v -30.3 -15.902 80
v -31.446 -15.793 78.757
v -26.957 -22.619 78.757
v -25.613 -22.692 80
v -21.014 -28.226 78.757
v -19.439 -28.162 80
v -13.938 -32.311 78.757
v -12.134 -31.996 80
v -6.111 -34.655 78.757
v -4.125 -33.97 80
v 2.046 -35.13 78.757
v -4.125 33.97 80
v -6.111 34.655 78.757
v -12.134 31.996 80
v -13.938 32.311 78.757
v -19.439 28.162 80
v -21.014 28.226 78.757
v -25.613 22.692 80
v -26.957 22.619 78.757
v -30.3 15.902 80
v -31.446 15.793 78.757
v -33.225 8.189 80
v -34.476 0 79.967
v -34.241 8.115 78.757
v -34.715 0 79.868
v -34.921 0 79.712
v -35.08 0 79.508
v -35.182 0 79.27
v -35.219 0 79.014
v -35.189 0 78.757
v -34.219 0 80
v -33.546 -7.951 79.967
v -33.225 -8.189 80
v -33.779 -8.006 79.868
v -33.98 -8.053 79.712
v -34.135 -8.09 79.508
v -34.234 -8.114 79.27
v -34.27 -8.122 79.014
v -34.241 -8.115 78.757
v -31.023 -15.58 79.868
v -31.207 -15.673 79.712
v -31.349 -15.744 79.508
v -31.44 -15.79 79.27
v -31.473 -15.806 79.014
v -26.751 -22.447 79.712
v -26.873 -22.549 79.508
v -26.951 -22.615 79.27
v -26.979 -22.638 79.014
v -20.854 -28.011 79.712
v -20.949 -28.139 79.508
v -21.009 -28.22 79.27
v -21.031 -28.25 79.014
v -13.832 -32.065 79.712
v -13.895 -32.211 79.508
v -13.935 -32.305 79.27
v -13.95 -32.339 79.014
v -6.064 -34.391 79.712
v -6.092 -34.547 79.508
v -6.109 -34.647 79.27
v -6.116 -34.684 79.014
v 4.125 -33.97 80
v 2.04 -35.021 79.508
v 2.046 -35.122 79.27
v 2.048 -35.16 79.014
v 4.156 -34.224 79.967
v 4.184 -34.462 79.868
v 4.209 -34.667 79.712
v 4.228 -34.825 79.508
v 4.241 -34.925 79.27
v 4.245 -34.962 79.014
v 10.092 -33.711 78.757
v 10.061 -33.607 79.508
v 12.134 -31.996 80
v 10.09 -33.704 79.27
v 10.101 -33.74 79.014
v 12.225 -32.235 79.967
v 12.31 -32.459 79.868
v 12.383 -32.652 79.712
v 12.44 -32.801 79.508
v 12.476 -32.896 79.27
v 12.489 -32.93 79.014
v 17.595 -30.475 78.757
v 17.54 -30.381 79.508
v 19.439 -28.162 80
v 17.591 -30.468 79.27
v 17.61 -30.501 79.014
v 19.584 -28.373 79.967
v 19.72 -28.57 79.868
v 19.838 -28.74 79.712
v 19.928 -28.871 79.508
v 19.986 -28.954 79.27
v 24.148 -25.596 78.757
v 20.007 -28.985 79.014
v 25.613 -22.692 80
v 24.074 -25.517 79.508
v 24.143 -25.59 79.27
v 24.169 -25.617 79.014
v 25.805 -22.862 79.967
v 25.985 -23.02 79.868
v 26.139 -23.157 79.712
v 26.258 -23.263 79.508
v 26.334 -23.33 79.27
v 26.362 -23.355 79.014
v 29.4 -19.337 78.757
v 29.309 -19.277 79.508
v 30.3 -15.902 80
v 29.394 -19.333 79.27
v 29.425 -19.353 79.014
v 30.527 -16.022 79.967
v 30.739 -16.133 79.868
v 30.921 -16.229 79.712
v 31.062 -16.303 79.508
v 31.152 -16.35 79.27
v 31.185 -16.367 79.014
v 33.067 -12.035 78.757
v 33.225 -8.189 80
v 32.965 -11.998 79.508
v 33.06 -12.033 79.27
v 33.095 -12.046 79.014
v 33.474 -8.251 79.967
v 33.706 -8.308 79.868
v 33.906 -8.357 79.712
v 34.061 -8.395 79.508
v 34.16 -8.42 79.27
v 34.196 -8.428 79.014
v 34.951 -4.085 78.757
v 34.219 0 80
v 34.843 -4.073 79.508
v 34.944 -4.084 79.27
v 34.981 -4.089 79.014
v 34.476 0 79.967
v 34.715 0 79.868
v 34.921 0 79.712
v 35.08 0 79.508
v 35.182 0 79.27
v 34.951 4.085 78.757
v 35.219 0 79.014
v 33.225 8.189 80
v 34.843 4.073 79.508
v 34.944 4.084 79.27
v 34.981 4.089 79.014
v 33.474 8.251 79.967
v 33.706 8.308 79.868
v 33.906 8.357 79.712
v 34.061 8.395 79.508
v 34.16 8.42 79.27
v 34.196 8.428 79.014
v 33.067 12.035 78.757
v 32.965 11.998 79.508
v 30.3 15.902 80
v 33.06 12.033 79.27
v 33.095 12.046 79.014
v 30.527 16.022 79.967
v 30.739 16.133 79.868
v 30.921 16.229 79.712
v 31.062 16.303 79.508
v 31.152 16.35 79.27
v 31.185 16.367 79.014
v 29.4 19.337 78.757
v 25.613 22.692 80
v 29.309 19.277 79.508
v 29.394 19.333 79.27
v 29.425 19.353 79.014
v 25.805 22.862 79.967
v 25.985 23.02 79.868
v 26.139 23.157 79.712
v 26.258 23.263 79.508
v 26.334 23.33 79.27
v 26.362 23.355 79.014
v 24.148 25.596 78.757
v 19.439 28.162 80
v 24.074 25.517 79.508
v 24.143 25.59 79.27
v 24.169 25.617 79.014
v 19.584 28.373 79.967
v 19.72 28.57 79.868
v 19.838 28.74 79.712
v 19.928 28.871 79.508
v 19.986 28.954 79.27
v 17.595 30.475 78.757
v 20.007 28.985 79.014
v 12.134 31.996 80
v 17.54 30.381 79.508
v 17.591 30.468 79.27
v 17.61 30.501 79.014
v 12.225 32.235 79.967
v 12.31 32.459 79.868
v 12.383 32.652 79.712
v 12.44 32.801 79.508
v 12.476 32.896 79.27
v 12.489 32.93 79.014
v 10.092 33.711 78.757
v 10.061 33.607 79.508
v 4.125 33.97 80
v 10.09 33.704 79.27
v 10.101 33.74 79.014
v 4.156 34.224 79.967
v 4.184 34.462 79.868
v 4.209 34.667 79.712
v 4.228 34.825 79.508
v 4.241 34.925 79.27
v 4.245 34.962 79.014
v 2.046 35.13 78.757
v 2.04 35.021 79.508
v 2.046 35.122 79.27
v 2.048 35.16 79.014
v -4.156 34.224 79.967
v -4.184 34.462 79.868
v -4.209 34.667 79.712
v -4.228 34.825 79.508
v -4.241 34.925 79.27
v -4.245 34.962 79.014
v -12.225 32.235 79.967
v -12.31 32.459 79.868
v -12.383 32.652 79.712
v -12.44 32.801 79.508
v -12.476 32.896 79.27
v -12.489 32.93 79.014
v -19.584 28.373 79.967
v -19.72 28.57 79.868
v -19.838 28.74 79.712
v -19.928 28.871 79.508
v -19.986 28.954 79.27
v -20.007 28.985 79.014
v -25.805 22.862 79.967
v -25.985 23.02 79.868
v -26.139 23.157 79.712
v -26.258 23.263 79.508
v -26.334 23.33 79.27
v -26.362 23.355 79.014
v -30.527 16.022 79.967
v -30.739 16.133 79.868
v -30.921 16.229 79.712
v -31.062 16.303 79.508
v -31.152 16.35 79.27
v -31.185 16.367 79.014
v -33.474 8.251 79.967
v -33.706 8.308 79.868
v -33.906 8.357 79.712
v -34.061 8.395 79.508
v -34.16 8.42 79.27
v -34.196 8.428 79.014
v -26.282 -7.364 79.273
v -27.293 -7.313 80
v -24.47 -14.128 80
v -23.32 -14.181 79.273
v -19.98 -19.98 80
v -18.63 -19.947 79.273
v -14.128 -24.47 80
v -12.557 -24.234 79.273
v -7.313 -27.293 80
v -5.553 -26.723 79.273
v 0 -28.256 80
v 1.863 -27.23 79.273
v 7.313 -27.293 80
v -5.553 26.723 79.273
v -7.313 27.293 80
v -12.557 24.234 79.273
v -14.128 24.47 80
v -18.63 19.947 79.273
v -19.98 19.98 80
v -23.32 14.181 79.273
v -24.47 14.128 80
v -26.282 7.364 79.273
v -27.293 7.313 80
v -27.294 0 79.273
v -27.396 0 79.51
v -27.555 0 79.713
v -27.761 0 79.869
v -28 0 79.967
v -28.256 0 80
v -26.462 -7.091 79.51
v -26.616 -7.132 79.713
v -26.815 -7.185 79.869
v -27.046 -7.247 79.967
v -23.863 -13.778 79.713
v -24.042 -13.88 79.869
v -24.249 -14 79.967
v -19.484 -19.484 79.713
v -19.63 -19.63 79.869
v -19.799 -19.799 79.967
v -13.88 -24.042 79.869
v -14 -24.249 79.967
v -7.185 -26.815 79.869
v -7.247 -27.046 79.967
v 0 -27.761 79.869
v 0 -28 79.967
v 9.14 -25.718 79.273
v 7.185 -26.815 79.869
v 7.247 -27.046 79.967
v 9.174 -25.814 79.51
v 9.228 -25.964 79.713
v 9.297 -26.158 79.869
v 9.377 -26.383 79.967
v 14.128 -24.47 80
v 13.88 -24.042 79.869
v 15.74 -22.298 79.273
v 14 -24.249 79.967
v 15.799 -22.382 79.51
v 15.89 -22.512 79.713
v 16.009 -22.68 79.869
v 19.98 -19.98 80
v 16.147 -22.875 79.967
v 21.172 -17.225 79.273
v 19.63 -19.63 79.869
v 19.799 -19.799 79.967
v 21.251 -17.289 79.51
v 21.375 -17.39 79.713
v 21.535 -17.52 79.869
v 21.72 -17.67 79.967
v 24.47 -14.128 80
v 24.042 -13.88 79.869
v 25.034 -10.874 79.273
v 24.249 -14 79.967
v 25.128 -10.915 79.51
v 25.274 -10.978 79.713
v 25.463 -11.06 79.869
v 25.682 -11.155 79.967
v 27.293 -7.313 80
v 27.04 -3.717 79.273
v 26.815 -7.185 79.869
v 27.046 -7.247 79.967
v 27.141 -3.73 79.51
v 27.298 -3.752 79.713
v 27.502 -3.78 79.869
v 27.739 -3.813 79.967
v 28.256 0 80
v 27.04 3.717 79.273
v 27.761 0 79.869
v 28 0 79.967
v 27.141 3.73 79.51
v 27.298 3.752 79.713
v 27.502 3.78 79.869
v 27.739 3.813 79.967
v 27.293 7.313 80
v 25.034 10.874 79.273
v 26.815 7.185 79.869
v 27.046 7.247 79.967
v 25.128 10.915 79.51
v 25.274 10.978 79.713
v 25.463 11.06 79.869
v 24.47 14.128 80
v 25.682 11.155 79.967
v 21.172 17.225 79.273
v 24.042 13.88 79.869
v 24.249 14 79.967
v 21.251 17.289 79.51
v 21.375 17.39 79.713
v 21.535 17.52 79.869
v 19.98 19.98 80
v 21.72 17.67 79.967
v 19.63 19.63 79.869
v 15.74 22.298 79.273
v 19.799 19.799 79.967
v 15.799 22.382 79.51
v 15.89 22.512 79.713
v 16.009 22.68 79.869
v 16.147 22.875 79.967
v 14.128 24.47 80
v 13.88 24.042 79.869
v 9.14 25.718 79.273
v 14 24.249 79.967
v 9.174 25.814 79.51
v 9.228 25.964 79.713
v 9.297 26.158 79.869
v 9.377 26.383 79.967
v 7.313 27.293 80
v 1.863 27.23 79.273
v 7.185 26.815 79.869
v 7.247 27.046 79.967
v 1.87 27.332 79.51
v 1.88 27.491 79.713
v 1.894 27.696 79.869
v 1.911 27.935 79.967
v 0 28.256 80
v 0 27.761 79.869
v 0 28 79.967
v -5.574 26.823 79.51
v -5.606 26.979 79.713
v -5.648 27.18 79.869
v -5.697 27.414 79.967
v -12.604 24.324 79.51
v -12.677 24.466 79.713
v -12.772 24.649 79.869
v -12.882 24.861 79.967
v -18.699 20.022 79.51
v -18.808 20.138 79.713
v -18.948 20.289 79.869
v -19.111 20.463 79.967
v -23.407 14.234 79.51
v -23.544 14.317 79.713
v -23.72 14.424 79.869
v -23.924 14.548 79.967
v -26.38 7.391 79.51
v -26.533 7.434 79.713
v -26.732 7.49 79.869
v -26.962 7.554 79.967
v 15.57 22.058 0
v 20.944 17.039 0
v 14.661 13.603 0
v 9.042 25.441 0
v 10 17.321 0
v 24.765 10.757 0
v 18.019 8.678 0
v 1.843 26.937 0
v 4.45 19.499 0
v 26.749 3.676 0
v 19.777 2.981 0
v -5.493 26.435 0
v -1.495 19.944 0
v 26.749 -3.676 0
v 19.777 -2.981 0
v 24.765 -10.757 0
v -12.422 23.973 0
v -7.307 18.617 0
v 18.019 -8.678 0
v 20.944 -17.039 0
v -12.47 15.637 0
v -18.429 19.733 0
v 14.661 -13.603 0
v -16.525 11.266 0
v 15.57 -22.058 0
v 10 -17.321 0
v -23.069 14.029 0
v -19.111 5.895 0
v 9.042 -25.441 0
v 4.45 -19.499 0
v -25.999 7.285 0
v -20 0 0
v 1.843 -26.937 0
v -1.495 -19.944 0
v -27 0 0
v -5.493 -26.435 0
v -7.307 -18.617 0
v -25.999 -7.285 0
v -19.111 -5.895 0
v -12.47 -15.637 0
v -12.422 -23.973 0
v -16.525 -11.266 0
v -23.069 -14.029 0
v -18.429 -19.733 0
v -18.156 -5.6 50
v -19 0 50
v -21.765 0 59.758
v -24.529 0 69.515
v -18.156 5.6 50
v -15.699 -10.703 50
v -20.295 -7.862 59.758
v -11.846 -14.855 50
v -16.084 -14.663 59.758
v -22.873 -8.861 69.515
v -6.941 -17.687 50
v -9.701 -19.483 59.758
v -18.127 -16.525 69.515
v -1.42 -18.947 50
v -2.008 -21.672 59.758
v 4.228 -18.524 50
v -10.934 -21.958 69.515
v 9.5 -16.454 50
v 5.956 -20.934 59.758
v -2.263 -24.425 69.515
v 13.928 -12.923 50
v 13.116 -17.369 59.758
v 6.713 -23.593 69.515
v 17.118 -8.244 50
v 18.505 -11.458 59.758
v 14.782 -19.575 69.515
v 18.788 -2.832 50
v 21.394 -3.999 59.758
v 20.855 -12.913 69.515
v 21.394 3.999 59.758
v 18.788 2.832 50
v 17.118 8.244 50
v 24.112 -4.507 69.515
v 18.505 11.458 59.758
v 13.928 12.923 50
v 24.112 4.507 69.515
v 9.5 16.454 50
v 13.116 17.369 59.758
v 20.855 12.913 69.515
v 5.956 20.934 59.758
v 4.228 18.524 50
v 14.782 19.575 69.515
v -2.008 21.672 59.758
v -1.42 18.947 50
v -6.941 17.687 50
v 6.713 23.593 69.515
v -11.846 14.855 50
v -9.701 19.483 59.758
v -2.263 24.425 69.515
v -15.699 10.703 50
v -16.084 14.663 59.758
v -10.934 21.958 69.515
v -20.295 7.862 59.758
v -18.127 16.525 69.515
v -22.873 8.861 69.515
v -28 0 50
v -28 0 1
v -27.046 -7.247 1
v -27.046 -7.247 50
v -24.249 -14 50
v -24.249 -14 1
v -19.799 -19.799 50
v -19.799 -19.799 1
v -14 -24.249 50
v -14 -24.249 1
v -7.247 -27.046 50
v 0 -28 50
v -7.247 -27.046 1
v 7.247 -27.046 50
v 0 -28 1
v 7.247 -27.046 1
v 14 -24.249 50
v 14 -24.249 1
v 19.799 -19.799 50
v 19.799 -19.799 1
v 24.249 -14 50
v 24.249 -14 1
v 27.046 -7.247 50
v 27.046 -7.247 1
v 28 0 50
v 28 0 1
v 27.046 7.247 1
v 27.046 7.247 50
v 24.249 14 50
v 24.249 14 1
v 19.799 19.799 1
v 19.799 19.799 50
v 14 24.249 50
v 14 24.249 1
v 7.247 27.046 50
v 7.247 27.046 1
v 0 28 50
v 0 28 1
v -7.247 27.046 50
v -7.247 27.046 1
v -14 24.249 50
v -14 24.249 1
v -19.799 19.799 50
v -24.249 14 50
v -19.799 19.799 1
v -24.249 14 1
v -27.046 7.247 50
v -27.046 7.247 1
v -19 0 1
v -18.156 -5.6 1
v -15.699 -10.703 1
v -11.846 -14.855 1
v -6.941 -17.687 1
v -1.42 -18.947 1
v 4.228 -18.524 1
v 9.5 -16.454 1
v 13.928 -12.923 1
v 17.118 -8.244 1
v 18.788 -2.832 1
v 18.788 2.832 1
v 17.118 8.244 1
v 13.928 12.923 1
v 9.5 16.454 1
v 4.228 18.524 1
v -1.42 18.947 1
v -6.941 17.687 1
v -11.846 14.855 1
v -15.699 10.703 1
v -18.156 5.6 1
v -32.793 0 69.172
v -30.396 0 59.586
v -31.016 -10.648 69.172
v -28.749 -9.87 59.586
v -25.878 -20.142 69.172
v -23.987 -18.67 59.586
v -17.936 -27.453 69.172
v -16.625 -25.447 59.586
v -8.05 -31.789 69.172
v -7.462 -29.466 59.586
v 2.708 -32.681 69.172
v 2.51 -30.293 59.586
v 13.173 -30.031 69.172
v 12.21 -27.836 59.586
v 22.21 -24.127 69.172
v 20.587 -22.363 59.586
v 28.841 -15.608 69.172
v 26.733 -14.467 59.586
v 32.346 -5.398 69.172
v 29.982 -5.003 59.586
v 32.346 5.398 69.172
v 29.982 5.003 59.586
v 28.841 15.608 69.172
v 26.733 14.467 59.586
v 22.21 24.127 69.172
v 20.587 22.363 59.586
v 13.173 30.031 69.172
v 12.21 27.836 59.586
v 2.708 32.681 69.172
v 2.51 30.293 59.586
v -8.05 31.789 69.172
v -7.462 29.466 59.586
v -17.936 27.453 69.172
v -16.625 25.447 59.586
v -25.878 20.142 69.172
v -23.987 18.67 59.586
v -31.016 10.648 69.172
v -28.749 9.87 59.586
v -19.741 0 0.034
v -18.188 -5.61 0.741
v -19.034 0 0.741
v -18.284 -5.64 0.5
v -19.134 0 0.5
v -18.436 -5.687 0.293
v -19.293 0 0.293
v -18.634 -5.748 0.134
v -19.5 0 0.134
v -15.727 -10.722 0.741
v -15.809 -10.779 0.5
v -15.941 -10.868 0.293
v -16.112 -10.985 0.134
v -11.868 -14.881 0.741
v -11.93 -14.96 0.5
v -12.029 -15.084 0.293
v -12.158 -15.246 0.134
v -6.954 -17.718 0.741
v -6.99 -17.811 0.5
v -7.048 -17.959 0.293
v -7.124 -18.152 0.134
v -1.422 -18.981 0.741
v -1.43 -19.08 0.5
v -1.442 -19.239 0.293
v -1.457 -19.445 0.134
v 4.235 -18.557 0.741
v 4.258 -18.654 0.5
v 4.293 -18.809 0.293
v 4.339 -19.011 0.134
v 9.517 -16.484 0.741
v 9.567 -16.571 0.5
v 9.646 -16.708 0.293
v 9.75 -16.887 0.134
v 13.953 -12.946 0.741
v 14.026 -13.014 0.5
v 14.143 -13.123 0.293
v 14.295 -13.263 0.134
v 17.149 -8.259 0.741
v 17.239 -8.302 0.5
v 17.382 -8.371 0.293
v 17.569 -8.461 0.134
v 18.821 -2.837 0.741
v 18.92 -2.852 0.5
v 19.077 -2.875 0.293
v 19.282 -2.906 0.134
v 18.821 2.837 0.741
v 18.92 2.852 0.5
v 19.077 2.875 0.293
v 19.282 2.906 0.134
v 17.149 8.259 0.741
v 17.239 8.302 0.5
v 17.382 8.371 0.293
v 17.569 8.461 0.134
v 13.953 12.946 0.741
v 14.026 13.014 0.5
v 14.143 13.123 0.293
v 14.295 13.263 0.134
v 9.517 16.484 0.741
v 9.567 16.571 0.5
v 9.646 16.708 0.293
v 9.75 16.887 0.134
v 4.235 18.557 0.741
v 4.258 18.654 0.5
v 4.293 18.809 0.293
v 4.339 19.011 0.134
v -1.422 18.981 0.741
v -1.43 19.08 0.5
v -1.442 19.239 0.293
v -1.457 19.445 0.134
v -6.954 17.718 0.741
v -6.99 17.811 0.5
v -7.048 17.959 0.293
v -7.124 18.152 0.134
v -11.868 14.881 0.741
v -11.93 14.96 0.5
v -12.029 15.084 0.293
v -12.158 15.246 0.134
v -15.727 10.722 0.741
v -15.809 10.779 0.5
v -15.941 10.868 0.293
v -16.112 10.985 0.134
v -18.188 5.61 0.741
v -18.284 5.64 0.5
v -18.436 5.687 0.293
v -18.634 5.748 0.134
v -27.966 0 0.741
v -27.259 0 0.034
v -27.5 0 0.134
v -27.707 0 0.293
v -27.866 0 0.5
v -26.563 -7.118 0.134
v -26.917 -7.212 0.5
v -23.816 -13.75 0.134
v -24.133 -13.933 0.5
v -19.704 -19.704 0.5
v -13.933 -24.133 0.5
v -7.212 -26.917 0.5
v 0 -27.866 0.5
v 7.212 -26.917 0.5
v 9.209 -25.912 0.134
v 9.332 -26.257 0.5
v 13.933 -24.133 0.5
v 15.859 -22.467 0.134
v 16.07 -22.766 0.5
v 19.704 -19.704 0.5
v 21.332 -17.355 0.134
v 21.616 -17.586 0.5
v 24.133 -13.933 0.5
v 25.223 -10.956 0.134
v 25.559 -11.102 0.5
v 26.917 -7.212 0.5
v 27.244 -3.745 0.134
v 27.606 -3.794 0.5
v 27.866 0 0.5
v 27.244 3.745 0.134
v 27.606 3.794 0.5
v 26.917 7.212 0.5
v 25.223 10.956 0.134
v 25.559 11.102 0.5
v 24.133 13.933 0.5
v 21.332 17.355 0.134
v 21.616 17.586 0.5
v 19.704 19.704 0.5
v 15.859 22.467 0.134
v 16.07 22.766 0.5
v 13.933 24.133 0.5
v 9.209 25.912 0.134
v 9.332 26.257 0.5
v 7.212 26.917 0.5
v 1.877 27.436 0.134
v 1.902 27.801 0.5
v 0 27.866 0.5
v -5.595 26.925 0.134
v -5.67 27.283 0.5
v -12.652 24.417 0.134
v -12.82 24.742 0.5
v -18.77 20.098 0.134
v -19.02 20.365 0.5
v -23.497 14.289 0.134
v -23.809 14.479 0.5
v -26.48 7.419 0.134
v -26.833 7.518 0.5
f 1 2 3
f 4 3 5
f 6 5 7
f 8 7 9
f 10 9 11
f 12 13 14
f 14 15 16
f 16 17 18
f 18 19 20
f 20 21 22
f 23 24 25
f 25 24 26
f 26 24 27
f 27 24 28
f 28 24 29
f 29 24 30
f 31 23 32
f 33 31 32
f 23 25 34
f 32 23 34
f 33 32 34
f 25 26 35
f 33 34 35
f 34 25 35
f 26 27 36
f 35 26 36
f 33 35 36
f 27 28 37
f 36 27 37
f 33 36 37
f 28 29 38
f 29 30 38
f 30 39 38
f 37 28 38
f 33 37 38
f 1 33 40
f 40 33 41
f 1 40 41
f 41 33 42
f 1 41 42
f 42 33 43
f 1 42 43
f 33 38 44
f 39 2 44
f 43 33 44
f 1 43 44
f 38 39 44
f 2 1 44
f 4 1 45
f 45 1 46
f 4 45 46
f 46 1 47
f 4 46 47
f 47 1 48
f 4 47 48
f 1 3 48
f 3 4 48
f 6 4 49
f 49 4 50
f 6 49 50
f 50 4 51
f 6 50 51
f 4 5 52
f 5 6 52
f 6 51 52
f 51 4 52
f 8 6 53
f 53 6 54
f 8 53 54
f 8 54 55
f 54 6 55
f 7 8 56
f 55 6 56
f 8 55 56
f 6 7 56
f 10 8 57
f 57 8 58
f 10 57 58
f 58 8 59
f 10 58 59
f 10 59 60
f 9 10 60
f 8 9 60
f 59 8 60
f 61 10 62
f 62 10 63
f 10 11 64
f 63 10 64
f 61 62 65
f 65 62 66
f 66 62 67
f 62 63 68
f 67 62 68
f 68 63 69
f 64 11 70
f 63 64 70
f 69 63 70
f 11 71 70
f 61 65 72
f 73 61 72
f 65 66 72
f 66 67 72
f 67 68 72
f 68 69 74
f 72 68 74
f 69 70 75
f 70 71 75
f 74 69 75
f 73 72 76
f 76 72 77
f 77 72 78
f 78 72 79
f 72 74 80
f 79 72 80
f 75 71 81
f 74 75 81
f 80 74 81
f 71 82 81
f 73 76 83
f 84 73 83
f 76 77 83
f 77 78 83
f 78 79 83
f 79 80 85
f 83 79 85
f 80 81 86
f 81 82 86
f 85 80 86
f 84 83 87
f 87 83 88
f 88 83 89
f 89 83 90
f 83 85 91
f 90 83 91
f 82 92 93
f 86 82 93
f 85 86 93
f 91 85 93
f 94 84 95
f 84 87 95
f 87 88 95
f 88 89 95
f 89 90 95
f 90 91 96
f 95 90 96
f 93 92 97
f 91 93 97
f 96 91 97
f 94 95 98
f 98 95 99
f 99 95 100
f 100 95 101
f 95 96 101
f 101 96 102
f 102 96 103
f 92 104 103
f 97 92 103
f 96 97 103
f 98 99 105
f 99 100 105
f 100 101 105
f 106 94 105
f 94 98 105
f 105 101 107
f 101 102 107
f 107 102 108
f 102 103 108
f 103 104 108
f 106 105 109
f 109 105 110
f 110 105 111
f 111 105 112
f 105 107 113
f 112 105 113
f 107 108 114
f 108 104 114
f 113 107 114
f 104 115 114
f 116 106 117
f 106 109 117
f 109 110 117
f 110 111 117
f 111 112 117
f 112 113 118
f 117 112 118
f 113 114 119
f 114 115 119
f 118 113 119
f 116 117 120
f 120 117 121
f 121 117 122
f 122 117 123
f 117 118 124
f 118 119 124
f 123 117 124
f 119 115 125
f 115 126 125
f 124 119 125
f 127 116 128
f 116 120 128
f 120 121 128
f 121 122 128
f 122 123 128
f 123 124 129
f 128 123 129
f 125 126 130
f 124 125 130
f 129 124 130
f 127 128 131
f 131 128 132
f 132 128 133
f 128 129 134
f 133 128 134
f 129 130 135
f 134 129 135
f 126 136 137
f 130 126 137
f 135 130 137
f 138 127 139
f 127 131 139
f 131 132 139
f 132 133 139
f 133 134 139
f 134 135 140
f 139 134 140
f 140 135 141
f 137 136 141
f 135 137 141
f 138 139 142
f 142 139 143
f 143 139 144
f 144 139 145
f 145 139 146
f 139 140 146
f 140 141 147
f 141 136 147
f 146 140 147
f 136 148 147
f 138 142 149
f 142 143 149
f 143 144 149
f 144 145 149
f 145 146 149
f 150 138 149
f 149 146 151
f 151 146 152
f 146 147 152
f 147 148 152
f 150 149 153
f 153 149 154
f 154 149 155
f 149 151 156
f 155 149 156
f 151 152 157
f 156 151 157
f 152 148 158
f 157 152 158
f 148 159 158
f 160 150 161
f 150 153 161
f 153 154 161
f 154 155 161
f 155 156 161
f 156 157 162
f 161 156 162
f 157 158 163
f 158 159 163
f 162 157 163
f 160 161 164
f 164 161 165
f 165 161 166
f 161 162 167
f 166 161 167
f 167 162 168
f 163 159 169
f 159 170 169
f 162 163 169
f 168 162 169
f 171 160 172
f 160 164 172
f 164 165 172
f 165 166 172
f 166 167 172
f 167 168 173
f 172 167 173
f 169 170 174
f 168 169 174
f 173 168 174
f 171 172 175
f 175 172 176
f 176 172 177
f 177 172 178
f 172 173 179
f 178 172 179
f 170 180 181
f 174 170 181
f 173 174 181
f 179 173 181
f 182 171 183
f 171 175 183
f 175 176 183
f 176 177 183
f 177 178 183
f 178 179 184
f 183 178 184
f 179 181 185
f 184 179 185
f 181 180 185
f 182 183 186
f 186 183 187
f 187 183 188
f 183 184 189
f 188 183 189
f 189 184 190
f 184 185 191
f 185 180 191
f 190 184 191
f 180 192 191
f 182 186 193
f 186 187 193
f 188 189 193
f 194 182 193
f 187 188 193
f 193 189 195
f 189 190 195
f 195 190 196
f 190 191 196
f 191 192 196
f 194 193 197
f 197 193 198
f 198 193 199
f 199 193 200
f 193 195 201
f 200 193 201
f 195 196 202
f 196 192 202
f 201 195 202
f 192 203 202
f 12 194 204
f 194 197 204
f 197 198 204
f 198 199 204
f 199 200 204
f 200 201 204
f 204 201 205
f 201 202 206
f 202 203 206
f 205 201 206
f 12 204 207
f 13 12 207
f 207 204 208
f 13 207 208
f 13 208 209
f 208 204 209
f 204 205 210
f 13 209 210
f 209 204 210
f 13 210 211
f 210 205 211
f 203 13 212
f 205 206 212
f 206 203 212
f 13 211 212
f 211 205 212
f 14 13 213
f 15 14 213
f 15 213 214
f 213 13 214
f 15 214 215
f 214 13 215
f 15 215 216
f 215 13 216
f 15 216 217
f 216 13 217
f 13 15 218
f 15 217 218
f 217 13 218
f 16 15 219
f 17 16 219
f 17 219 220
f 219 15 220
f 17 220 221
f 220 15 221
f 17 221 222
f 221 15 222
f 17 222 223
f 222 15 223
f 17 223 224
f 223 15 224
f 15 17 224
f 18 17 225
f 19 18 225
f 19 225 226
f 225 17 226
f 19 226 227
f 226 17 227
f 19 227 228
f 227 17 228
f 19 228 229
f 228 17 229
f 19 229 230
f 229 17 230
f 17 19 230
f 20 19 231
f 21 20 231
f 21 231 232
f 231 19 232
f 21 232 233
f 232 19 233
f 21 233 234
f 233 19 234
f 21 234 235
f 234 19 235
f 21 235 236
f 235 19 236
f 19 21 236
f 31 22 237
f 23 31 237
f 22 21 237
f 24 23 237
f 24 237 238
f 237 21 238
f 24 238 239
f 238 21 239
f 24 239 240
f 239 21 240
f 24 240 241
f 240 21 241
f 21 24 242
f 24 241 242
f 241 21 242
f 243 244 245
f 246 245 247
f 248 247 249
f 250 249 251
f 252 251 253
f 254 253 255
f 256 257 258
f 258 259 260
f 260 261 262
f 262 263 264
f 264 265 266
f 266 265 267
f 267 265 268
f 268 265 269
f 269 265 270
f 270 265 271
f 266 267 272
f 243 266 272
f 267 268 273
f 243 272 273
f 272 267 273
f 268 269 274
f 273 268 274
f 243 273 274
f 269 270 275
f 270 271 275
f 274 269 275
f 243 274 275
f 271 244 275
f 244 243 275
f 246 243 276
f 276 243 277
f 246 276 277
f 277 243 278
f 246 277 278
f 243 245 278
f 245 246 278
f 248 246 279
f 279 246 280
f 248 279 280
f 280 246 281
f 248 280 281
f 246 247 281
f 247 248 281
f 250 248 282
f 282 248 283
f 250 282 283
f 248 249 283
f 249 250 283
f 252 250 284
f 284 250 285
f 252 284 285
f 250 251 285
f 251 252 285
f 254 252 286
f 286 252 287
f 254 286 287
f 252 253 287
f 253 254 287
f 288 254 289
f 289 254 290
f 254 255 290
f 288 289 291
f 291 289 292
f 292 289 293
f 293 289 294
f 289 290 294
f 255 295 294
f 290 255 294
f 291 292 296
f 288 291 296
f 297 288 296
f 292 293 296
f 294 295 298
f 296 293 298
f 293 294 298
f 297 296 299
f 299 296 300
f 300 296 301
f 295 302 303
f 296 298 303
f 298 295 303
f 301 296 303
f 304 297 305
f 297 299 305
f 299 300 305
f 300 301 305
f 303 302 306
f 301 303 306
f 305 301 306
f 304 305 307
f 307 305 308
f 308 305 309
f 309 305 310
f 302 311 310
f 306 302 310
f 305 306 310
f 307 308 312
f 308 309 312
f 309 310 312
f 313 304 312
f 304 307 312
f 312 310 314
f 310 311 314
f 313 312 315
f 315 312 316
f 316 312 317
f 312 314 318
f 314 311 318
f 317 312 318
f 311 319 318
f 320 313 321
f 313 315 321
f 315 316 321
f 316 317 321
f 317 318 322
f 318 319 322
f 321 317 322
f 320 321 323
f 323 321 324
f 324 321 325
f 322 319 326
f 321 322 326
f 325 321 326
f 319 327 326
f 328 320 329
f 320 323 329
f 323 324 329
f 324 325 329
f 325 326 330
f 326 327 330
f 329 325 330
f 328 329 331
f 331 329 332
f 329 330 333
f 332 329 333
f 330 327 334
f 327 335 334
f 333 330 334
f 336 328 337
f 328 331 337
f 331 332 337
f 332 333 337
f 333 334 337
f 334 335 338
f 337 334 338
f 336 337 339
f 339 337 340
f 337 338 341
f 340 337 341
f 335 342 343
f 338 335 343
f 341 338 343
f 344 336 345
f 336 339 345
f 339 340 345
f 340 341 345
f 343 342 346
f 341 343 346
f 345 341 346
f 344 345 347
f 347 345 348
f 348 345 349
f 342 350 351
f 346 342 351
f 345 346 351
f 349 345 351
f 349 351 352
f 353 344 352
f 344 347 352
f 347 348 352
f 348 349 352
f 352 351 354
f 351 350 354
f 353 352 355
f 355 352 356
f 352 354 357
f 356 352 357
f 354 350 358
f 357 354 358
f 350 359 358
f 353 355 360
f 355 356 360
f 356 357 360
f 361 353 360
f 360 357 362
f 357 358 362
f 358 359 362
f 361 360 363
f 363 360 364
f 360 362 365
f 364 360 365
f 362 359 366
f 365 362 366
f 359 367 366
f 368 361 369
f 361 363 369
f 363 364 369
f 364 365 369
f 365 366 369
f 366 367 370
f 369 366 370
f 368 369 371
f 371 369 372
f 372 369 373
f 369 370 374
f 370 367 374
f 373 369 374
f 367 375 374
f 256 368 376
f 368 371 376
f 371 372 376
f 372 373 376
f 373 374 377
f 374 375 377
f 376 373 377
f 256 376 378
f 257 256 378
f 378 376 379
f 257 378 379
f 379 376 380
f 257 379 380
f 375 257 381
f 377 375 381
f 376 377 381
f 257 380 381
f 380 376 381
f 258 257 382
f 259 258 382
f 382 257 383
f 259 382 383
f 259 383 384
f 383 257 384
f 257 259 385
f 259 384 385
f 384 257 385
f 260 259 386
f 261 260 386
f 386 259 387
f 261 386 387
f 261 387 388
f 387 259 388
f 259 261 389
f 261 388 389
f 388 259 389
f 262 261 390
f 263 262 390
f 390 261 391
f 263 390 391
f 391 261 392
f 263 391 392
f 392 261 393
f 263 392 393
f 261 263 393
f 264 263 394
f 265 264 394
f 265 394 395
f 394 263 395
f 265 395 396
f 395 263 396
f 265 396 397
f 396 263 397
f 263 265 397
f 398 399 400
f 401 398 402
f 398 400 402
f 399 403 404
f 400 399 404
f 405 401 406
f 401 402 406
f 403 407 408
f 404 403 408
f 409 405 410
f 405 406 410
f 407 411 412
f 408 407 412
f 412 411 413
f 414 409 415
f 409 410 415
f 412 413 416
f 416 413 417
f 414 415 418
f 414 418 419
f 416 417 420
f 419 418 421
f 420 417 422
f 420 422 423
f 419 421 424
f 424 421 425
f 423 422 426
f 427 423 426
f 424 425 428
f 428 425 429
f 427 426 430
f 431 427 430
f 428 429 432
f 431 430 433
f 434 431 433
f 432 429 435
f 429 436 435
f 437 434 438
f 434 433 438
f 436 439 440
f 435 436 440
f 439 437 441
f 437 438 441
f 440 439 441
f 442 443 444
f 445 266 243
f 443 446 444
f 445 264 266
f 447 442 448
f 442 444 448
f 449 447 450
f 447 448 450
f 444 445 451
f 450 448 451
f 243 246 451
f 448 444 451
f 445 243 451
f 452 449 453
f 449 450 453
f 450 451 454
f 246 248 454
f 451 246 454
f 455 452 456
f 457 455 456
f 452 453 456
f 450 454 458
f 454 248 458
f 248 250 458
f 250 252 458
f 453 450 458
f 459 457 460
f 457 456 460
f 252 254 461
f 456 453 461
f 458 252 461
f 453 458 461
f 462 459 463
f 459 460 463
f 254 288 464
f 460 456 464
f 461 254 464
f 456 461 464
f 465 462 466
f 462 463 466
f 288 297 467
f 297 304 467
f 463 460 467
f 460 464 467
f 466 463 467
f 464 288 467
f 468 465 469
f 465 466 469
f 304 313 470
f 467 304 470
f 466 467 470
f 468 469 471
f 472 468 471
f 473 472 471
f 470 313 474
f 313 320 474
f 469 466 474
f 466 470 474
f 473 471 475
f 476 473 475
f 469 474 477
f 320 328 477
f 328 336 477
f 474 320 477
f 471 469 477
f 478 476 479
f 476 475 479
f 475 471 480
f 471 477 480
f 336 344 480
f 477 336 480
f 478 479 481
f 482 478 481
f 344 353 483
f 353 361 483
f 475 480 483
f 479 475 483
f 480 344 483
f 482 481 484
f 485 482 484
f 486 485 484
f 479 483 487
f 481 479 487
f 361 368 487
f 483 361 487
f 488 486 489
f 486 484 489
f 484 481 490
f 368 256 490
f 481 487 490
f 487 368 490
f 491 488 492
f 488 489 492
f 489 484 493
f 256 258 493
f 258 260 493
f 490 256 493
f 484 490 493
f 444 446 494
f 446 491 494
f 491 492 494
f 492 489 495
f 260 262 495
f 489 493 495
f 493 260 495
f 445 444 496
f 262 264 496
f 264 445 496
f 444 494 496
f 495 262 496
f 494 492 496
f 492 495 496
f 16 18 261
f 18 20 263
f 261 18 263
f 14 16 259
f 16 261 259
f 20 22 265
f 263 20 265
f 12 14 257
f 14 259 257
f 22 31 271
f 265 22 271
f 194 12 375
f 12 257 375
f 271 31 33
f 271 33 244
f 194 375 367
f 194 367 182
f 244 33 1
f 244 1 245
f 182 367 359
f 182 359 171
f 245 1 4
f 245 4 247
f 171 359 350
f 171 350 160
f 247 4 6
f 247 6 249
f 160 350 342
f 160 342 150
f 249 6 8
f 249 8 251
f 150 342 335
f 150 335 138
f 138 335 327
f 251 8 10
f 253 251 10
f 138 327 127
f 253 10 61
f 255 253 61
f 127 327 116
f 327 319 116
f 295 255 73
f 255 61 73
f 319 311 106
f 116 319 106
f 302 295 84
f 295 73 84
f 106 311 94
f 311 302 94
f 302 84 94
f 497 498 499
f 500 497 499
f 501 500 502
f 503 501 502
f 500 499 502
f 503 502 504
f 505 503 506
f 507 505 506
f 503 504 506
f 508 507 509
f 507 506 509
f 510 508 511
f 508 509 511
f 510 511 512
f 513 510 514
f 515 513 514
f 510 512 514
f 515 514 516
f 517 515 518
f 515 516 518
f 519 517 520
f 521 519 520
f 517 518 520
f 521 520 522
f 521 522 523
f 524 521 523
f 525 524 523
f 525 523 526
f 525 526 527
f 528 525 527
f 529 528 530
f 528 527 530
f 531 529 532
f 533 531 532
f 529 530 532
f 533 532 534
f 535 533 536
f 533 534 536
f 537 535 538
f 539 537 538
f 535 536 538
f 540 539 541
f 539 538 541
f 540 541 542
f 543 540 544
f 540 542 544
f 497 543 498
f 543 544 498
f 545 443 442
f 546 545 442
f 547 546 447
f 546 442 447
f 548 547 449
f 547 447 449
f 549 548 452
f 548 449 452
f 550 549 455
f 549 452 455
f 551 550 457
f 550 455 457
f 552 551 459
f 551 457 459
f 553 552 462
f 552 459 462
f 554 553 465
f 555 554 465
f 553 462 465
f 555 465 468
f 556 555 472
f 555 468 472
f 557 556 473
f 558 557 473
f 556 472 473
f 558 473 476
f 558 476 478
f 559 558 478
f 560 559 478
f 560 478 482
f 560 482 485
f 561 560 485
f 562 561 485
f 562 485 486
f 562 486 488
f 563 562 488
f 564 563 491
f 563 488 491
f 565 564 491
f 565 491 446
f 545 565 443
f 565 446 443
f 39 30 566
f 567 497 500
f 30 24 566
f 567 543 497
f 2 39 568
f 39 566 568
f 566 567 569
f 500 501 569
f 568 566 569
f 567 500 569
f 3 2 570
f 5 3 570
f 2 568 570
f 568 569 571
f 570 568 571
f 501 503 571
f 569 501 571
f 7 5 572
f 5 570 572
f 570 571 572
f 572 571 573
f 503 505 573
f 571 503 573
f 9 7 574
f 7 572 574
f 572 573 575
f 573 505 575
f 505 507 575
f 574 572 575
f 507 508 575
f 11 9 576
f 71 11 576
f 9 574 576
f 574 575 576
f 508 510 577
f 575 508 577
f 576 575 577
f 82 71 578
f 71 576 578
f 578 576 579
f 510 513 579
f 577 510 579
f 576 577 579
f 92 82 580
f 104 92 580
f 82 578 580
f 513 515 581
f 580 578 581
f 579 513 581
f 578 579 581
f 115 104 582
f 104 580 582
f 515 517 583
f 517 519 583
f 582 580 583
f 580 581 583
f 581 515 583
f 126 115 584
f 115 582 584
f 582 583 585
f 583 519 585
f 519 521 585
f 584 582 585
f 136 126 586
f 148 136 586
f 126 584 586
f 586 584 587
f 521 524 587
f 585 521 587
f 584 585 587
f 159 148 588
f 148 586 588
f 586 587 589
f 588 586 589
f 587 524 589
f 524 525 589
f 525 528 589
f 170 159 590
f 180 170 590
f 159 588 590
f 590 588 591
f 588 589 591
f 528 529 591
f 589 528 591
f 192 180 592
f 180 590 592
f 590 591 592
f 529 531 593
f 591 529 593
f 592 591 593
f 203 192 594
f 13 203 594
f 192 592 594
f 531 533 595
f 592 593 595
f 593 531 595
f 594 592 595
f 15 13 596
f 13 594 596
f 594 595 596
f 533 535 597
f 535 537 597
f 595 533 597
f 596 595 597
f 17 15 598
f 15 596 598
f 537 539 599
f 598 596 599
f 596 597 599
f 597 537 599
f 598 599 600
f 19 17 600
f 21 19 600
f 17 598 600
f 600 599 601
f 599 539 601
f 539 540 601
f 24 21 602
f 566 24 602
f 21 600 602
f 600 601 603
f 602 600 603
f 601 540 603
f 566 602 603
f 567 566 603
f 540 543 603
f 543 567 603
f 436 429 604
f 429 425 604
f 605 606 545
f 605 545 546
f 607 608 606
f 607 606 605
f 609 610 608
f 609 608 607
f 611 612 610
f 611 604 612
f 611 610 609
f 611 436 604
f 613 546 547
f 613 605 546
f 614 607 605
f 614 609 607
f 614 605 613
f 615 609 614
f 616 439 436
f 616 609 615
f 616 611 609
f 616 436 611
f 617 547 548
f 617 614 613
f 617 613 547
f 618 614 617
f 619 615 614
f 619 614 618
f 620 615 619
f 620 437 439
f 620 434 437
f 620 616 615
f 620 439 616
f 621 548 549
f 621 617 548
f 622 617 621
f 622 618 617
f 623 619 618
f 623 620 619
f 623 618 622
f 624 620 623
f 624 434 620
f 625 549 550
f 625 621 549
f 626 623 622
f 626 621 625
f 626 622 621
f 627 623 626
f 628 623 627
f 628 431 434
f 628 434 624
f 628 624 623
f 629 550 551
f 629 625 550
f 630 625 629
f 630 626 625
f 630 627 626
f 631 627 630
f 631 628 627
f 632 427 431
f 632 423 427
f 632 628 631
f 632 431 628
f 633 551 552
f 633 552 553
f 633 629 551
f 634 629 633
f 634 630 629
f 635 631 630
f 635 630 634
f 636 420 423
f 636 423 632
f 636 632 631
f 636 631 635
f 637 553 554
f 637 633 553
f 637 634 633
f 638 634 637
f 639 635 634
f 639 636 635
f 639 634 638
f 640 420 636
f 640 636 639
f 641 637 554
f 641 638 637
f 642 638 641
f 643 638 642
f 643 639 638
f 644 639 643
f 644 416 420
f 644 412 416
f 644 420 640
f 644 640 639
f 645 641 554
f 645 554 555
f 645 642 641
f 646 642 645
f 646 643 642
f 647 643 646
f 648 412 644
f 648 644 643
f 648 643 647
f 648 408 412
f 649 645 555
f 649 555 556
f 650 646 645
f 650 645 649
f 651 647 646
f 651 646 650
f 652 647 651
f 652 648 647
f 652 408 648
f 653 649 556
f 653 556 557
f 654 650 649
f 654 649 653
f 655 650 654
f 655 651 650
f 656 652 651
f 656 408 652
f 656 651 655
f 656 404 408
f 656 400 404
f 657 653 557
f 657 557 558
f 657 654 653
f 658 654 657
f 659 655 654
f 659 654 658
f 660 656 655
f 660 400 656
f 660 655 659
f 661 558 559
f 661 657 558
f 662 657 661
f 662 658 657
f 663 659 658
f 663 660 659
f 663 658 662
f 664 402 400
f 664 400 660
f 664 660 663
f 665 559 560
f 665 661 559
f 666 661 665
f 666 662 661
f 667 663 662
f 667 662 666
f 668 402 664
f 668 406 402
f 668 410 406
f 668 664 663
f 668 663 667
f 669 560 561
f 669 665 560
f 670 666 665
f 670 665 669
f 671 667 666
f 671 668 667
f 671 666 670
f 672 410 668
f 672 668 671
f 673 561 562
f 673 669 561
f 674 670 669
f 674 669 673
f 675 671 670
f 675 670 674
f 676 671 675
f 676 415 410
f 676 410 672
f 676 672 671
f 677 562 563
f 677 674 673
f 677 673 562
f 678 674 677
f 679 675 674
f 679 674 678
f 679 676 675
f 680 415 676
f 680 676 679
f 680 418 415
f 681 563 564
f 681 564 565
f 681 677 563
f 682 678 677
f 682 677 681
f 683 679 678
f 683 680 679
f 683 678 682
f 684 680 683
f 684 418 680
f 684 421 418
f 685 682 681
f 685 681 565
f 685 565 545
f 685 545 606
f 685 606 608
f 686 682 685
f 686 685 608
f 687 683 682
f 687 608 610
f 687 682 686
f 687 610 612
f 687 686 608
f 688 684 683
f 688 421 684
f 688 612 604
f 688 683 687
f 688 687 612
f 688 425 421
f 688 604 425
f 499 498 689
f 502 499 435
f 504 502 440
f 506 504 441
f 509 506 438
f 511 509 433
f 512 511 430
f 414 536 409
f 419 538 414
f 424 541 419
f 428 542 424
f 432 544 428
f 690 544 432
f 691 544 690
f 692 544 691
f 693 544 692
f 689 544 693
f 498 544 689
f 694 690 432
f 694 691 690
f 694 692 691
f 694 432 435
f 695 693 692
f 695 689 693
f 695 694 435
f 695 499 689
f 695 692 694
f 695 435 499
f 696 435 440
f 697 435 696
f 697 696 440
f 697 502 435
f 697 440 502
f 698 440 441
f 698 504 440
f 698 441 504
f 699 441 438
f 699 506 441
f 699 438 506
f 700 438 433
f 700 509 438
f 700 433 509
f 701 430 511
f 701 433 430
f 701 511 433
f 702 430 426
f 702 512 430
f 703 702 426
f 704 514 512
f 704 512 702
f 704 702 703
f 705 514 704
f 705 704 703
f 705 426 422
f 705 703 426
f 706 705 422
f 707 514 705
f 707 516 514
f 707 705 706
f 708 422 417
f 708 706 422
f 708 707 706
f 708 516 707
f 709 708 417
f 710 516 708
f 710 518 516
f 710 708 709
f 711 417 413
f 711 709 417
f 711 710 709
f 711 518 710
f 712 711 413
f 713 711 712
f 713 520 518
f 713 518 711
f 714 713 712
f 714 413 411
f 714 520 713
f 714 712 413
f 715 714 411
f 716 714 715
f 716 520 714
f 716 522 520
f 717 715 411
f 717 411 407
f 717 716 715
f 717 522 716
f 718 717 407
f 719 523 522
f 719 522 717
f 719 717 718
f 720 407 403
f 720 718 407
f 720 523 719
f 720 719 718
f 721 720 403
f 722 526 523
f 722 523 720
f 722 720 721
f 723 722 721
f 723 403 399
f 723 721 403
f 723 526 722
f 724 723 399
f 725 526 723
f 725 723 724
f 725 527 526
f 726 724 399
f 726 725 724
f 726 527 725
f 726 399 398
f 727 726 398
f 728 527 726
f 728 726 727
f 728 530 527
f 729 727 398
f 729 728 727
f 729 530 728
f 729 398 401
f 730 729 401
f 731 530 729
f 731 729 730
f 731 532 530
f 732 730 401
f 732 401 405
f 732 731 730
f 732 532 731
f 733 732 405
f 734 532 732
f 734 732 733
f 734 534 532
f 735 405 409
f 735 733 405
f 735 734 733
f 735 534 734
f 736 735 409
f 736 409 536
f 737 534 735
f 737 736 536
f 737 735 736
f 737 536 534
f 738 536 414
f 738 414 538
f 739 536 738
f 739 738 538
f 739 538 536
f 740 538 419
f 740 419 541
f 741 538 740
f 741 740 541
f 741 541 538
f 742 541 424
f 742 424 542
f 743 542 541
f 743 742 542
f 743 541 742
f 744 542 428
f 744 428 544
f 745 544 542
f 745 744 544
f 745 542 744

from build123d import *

# Parameters (mm, degrees)
F2_R = 1
F3_R = 1


with BuildPart() as f1:
    # F0 (on Front) → F1 (revolve)
    with BuildSketch(Plane.XZ):
        Polygon((-28, 50), (-28, 0), (-19, 0), (-19, 50), (-27.5, 80), (-35.5, 80), align=None)
    revolve(axis=Axis((0, 0, 61.423291), (0, 0, 1)))

    # F2
    f2_edges = [f1.edges().sort_by_distance(p)[0] for p in [
        (27.5, 0, 80),
    ]]
    fillet(f2_edges, radius=F2_R)

    # F3
    f3_edges = [f1.edges().sort_by_distance(p)[0] for p in [
        (35.5, 0, 80),
        (28, 0, 0),
        (19, 0, 0),
    ]]
    fillet(f3_edges, radius=F3_R)


solid = f1.part
